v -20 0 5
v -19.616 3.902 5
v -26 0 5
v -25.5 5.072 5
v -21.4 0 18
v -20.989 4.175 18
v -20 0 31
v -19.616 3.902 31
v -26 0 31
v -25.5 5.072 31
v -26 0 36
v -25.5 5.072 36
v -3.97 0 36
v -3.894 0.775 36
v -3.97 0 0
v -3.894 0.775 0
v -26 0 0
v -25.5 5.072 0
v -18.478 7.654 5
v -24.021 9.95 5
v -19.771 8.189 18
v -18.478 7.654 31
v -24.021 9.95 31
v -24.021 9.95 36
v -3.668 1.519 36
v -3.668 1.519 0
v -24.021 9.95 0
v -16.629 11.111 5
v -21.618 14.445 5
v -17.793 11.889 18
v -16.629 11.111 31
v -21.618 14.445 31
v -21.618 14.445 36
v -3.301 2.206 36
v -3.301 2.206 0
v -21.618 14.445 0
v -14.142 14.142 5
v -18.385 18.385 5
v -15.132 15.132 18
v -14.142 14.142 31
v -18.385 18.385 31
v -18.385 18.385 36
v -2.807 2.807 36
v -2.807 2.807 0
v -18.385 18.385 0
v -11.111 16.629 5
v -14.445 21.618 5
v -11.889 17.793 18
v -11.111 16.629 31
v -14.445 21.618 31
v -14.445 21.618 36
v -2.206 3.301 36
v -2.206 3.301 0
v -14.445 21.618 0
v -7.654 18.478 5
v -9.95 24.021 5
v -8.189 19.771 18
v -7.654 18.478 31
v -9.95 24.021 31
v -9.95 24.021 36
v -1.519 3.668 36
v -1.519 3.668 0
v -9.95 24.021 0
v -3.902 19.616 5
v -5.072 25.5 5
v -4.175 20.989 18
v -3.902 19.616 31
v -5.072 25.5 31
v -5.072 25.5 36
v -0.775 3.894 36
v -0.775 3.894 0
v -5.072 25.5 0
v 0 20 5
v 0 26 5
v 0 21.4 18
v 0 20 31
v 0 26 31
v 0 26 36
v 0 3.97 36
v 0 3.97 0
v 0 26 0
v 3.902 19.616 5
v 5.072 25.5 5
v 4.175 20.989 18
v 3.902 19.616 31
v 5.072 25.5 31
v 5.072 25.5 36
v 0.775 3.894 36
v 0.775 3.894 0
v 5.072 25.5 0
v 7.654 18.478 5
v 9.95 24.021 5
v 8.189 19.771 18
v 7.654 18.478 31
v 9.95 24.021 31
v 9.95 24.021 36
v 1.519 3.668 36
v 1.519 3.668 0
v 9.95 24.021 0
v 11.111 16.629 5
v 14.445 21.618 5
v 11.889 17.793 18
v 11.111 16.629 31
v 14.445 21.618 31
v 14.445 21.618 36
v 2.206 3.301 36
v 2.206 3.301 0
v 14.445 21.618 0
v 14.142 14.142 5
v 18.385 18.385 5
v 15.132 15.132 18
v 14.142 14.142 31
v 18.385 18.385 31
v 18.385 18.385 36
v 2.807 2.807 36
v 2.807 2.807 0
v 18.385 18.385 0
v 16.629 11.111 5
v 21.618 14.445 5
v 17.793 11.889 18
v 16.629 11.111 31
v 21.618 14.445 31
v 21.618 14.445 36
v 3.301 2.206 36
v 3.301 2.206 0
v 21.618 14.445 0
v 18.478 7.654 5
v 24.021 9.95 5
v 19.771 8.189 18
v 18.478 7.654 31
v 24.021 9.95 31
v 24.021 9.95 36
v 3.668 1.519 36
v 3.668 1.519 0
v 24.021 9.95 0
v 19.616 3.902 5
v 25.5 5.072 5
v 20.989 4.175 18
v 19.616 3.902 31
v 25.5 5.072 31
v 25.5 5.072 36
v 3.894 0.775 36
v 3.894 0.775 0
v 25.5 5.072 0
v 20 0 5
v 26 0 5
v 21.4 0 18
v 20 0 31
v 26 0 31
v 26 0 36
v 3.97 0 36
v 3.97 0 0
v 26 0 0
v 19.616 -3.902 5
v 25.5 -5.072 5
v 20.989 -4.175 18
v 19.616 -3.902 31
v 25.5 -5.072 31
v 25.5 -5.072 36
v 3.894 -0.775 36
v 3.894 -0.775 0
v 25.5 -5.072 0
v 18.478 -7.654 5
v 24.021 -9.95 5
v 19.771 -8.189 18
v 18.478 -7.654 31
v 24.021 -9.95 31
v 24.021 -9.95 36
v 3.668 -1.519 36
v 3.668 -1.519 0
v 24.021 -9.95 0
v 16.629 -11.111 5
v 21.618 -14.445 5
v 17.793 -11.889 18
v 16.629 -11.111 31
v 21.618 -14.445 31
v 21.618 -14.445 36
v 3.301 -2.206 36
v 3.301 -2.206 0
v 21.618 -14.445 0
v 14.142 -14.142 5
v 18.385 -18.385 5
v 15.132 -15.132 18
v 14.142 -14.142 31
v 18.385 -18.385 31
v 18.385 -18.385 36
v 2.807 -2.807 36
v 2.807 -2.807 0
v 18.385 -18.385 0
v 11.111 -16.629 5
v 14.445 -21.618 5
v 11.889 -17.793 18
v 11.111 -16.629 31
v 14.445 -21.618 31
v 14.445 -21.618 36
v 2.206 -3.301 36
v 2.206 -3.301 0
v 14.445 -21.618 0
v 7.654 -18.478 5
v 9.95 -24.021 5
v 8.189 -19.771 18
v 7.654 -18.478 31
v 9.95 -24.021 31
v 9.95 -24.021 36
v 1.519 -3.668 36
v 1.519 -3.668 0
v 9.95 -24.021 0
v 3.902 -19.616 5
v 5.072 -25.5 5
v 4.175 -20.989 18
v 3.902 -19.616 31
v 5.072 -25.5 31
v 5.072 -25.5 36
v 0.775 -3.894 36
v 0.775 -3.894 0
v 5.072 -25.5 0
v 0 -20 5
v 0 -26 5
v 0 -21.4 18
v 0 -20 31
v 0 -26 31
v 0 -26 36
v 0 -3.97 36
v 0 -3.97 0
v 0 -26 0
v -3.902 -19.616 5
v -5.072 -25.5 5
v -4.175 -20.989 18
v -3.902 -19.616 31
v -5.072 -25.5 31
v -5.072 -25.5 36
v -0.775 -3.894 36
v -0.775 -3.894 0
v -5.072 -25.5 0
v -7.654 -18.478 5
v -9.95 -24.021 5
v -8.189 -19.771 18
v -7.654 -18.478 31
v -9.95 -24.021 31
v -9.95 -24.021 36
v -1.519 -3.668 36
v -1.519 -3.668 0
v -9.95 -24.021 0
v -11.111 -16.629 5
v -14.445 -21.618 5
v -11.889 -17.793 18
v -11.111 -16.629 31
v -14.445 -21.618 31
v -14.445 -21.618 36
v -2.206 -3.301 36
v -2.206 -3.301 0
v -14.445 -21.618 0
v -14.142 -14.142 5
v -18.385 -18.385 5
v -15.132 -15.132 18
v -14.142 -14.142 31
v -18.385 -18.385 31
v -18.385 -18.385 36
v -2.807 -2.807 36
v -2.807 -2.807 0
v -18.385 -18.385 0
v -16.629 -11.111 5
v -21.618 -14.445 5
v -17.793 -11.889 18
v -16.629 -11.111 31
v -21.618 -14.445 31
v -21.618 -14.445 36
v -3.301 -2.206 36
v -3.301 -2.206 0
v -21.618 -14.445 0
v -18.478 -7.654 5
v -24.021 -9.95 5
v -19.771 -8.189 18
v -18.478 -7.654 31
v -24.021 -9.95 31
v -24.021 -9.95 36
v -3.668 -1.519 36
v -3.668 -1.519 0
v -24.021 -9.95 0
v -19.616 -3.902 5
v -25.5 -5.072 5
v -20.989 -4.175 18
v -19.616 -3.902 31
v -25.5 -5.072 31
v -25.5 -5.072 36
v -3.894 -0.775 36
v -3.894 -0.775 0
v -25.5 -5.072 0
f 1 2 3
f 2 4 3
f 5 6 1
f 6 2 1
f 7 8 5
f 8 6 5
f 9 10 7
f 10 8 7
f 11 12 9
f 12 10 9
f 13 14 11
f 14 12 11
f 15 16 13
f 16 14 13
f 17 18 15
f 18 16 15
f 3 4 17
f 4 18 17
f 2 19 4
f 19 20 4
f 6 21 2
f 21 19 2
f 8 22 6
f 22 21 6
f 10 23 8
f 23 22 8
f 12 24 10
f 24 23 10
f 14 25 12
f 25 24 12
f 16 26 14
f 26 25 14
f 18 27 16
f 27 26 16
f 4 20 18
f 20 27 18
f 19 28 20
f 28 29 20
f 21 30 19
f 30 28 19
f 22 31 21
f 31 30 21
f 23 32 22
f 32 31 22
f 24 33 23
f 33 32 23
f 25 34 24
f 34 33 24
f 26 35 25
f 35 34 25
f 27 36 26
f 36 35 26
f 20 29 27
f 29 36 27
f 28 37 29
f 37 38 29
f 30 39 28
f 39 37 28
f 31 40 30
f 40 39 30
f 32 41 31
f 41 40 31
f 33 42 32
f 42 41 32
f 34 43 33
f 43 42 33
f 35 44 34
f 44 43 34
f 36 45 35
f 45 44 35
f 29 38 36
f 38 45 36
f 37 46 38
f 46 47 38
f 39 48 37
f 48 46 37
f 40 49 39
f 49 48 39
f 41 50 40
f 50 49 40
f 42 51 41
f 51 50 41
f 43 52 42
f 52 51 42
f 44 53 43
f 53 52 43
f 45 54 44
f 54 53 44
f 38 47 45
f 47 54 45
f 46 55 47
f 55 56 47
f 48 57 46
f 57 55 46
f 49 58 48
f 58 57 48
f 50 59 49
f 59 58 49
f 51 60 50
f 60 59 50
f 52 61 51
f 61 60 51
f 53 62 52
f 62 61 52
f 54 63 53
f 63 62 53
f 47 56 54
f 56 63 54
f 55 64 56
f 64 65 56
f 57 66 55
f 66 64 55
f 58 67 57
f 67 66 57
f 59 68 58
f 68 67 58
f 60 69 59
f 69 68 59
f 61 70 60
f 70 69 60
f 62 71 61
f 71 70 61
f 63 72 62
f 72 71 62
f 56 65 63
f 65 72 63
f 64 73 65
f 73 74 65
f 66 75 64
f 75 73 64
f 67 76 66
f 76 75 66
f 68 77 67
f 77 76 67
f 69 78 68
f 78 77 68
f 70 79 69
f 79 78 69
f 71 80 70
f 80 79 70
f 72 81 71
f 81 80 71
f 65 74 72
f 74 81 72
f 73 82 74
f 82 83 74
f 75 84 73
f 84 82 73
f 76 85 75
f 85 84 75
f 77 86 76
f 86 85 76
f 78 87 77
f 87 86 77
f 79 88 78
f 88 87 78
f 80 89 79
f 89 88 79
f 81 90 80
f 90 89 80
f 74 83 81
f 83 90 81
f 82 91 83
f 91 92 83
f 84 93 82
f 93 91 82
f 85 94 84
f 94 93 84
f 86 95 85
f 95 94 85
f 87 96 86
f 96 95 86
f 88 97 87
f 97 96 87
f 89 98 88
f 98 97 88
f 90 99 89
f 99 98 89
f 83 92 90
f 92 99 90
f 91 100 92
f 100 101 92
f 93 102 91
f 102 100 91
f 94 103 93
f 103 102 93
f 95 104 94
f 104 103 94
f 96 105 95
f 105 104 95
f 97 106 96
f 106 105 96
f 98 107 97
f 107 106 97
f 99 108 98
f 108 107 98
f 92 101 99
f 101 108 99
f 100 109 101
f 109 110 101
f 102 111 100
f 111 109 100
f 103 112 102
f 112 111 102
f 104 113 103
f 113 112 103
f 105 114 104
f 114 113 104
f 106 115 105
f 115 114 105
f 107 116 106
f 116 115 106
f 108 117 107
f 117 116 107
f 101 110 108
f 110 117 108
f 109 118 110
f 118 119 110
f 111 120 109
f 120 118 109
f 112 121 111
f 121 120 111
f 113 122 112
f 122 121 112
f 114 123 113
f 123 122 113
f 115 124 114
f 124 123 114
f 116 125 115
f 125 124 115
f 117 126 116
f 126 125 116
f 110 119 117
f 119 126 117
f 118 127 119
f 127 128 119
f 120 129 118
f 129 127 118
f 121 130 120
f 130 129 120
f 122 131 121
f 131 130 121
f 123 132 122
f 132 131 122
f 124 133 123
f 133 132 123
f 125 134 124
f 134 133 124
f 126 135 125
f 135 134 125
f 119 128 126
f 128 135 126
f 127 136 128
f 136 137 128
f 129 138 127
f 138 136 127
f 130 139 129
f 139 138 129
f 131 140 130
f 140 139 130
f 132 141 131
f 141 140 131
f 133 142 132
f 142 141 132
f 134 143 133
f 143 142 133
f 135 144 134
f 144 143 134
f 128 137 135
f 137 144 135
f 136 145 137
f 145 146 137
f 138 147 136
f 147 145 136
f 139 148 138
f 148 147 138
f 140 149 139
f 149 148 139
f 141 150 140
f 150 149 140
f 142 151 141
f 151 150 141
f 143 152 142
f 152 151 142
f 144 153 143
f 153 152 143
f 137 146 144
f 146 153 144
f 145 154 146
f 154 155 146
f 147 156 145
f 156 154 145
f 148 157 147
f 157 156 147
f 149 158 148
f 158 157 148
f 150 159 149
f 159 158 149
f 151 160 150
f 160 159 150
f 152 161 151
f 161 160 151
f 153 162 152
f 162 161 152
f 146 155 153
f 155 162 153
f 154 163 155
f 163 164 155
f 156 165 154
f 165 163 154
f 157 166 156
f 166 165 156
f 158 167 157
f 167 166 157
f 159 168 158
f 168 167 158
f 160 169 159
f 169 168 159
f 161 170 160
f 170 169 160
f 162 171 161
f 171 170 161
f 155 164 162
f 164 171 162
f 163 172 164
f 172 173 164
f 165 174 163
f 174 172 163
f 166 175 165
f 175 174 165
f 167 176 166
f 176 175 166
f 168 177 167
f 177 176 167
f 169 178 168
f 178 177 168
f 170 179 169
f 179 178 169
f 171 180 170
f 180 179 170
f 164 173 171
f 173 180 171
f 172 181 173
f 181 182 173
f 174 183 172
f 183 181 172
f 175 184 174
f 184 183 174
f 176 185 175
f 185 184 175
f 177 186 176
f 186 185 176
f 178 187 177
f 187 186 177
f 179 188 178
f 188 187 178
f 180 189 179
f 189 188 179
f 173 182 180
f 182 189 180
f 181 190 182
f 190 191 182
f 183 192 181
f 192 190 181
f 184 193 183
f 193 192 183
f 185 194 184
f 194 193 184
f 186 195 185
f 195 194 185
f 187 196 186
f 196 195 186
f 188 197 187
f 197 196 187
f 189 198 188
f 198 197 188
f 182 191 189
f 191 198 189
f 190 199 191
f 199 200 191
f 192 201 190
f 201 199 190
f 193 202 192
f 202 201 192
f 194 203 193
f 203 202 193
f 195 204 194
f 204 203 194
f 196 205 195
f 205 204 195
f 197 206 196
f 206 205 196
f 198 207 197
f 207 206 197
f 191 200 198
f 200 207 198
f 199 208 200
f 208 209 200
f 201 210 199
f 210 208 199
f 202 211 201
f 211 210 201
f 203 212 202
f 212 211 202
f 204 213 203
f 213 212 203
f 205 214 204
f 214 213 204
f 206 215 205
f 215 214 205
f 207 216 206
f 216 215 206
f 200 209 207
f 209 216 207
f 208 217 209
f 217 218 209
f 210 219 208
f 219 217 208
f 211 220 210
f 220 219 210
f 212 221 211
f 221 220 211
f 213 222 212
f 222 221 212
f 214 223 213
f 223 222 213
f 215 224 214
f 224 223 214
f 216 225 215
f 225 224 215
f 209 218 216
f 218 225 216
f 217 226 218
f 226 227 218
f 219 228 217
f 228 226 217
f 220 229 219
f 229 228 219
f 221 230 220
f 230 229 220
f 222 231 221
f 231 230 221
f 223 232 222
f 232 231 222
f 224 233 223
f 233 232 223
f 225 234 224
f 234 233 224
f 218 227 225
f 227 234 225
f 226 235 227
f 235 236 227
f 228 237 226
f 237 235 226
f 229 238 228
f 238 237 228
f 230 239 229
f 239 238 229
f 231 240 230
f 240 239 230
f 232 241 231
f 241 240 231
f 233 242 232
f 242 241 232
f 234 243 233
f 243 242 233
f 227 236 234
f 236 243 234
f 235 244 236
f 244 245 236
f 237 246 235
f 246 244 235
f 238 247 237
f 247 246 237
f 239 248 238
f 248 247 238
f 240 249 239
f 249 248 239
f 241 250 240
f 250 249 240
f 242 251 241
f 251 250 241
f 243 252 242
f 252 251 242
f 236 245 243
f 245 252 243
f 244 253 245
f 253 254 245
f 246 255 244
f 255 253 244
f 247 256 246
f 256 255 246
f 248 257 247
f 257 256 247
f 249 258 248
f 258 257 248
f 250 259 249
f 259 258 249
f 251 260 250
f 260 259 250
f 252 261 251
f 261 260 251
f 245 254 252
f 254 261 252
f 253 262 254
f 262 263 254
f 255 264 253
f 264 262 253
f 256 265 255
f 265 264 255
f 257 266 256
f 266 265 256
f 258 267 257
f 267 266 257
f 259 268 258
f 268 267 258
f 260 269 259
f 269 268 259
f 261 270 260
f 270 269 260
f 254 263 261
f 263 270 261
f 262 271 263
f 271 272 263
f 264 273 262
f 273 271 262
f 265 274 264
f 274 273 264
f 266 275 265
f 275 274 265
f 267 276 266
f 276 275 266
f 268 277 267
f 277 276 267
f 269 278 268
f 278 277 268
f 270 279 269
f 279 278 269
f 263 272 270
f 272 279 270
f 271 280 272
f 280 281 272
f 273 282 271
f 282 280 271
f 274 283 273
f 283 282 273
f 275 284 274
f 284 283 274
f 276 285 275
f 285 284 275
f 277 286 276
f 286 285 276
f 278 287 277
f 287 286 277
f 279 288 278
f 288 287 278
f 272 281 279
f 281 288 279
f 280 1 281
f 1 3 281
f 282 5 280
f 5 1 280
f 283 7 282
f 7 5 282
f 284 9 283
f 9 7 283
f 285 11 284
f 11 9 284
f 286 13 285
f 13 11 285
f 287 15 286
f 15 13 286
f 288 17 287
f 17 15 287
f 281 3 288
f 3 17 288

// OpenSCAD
$fn = 32;

// ----------------------------------------------------------------------
// Belt roller: 40 mm barrel, 36 mm wide, bore 7.94 mm
// ----------------------------------------------------------------------

// --- parameters (mm) ---
bore_d = 7.94;            // bore
barrel_d = 40;            // barrel diameter
roller_w = 36;            // roller width
flange_d = 52;            // flange diameter
flange_t = 5;             // flange thickness
hub_d = 27.94;            // hub diameter

roller_profile = [[3.97, 0], [26, 0], [26, 5], [20, 5], [21.4, 18], [20, 31], [26, 31], [26, 36], [3.97, 36]];

/* the profile stays clear of the axis, so the bore comes out of the revolve */
rotate_extrude() polygon(roller_profile);
